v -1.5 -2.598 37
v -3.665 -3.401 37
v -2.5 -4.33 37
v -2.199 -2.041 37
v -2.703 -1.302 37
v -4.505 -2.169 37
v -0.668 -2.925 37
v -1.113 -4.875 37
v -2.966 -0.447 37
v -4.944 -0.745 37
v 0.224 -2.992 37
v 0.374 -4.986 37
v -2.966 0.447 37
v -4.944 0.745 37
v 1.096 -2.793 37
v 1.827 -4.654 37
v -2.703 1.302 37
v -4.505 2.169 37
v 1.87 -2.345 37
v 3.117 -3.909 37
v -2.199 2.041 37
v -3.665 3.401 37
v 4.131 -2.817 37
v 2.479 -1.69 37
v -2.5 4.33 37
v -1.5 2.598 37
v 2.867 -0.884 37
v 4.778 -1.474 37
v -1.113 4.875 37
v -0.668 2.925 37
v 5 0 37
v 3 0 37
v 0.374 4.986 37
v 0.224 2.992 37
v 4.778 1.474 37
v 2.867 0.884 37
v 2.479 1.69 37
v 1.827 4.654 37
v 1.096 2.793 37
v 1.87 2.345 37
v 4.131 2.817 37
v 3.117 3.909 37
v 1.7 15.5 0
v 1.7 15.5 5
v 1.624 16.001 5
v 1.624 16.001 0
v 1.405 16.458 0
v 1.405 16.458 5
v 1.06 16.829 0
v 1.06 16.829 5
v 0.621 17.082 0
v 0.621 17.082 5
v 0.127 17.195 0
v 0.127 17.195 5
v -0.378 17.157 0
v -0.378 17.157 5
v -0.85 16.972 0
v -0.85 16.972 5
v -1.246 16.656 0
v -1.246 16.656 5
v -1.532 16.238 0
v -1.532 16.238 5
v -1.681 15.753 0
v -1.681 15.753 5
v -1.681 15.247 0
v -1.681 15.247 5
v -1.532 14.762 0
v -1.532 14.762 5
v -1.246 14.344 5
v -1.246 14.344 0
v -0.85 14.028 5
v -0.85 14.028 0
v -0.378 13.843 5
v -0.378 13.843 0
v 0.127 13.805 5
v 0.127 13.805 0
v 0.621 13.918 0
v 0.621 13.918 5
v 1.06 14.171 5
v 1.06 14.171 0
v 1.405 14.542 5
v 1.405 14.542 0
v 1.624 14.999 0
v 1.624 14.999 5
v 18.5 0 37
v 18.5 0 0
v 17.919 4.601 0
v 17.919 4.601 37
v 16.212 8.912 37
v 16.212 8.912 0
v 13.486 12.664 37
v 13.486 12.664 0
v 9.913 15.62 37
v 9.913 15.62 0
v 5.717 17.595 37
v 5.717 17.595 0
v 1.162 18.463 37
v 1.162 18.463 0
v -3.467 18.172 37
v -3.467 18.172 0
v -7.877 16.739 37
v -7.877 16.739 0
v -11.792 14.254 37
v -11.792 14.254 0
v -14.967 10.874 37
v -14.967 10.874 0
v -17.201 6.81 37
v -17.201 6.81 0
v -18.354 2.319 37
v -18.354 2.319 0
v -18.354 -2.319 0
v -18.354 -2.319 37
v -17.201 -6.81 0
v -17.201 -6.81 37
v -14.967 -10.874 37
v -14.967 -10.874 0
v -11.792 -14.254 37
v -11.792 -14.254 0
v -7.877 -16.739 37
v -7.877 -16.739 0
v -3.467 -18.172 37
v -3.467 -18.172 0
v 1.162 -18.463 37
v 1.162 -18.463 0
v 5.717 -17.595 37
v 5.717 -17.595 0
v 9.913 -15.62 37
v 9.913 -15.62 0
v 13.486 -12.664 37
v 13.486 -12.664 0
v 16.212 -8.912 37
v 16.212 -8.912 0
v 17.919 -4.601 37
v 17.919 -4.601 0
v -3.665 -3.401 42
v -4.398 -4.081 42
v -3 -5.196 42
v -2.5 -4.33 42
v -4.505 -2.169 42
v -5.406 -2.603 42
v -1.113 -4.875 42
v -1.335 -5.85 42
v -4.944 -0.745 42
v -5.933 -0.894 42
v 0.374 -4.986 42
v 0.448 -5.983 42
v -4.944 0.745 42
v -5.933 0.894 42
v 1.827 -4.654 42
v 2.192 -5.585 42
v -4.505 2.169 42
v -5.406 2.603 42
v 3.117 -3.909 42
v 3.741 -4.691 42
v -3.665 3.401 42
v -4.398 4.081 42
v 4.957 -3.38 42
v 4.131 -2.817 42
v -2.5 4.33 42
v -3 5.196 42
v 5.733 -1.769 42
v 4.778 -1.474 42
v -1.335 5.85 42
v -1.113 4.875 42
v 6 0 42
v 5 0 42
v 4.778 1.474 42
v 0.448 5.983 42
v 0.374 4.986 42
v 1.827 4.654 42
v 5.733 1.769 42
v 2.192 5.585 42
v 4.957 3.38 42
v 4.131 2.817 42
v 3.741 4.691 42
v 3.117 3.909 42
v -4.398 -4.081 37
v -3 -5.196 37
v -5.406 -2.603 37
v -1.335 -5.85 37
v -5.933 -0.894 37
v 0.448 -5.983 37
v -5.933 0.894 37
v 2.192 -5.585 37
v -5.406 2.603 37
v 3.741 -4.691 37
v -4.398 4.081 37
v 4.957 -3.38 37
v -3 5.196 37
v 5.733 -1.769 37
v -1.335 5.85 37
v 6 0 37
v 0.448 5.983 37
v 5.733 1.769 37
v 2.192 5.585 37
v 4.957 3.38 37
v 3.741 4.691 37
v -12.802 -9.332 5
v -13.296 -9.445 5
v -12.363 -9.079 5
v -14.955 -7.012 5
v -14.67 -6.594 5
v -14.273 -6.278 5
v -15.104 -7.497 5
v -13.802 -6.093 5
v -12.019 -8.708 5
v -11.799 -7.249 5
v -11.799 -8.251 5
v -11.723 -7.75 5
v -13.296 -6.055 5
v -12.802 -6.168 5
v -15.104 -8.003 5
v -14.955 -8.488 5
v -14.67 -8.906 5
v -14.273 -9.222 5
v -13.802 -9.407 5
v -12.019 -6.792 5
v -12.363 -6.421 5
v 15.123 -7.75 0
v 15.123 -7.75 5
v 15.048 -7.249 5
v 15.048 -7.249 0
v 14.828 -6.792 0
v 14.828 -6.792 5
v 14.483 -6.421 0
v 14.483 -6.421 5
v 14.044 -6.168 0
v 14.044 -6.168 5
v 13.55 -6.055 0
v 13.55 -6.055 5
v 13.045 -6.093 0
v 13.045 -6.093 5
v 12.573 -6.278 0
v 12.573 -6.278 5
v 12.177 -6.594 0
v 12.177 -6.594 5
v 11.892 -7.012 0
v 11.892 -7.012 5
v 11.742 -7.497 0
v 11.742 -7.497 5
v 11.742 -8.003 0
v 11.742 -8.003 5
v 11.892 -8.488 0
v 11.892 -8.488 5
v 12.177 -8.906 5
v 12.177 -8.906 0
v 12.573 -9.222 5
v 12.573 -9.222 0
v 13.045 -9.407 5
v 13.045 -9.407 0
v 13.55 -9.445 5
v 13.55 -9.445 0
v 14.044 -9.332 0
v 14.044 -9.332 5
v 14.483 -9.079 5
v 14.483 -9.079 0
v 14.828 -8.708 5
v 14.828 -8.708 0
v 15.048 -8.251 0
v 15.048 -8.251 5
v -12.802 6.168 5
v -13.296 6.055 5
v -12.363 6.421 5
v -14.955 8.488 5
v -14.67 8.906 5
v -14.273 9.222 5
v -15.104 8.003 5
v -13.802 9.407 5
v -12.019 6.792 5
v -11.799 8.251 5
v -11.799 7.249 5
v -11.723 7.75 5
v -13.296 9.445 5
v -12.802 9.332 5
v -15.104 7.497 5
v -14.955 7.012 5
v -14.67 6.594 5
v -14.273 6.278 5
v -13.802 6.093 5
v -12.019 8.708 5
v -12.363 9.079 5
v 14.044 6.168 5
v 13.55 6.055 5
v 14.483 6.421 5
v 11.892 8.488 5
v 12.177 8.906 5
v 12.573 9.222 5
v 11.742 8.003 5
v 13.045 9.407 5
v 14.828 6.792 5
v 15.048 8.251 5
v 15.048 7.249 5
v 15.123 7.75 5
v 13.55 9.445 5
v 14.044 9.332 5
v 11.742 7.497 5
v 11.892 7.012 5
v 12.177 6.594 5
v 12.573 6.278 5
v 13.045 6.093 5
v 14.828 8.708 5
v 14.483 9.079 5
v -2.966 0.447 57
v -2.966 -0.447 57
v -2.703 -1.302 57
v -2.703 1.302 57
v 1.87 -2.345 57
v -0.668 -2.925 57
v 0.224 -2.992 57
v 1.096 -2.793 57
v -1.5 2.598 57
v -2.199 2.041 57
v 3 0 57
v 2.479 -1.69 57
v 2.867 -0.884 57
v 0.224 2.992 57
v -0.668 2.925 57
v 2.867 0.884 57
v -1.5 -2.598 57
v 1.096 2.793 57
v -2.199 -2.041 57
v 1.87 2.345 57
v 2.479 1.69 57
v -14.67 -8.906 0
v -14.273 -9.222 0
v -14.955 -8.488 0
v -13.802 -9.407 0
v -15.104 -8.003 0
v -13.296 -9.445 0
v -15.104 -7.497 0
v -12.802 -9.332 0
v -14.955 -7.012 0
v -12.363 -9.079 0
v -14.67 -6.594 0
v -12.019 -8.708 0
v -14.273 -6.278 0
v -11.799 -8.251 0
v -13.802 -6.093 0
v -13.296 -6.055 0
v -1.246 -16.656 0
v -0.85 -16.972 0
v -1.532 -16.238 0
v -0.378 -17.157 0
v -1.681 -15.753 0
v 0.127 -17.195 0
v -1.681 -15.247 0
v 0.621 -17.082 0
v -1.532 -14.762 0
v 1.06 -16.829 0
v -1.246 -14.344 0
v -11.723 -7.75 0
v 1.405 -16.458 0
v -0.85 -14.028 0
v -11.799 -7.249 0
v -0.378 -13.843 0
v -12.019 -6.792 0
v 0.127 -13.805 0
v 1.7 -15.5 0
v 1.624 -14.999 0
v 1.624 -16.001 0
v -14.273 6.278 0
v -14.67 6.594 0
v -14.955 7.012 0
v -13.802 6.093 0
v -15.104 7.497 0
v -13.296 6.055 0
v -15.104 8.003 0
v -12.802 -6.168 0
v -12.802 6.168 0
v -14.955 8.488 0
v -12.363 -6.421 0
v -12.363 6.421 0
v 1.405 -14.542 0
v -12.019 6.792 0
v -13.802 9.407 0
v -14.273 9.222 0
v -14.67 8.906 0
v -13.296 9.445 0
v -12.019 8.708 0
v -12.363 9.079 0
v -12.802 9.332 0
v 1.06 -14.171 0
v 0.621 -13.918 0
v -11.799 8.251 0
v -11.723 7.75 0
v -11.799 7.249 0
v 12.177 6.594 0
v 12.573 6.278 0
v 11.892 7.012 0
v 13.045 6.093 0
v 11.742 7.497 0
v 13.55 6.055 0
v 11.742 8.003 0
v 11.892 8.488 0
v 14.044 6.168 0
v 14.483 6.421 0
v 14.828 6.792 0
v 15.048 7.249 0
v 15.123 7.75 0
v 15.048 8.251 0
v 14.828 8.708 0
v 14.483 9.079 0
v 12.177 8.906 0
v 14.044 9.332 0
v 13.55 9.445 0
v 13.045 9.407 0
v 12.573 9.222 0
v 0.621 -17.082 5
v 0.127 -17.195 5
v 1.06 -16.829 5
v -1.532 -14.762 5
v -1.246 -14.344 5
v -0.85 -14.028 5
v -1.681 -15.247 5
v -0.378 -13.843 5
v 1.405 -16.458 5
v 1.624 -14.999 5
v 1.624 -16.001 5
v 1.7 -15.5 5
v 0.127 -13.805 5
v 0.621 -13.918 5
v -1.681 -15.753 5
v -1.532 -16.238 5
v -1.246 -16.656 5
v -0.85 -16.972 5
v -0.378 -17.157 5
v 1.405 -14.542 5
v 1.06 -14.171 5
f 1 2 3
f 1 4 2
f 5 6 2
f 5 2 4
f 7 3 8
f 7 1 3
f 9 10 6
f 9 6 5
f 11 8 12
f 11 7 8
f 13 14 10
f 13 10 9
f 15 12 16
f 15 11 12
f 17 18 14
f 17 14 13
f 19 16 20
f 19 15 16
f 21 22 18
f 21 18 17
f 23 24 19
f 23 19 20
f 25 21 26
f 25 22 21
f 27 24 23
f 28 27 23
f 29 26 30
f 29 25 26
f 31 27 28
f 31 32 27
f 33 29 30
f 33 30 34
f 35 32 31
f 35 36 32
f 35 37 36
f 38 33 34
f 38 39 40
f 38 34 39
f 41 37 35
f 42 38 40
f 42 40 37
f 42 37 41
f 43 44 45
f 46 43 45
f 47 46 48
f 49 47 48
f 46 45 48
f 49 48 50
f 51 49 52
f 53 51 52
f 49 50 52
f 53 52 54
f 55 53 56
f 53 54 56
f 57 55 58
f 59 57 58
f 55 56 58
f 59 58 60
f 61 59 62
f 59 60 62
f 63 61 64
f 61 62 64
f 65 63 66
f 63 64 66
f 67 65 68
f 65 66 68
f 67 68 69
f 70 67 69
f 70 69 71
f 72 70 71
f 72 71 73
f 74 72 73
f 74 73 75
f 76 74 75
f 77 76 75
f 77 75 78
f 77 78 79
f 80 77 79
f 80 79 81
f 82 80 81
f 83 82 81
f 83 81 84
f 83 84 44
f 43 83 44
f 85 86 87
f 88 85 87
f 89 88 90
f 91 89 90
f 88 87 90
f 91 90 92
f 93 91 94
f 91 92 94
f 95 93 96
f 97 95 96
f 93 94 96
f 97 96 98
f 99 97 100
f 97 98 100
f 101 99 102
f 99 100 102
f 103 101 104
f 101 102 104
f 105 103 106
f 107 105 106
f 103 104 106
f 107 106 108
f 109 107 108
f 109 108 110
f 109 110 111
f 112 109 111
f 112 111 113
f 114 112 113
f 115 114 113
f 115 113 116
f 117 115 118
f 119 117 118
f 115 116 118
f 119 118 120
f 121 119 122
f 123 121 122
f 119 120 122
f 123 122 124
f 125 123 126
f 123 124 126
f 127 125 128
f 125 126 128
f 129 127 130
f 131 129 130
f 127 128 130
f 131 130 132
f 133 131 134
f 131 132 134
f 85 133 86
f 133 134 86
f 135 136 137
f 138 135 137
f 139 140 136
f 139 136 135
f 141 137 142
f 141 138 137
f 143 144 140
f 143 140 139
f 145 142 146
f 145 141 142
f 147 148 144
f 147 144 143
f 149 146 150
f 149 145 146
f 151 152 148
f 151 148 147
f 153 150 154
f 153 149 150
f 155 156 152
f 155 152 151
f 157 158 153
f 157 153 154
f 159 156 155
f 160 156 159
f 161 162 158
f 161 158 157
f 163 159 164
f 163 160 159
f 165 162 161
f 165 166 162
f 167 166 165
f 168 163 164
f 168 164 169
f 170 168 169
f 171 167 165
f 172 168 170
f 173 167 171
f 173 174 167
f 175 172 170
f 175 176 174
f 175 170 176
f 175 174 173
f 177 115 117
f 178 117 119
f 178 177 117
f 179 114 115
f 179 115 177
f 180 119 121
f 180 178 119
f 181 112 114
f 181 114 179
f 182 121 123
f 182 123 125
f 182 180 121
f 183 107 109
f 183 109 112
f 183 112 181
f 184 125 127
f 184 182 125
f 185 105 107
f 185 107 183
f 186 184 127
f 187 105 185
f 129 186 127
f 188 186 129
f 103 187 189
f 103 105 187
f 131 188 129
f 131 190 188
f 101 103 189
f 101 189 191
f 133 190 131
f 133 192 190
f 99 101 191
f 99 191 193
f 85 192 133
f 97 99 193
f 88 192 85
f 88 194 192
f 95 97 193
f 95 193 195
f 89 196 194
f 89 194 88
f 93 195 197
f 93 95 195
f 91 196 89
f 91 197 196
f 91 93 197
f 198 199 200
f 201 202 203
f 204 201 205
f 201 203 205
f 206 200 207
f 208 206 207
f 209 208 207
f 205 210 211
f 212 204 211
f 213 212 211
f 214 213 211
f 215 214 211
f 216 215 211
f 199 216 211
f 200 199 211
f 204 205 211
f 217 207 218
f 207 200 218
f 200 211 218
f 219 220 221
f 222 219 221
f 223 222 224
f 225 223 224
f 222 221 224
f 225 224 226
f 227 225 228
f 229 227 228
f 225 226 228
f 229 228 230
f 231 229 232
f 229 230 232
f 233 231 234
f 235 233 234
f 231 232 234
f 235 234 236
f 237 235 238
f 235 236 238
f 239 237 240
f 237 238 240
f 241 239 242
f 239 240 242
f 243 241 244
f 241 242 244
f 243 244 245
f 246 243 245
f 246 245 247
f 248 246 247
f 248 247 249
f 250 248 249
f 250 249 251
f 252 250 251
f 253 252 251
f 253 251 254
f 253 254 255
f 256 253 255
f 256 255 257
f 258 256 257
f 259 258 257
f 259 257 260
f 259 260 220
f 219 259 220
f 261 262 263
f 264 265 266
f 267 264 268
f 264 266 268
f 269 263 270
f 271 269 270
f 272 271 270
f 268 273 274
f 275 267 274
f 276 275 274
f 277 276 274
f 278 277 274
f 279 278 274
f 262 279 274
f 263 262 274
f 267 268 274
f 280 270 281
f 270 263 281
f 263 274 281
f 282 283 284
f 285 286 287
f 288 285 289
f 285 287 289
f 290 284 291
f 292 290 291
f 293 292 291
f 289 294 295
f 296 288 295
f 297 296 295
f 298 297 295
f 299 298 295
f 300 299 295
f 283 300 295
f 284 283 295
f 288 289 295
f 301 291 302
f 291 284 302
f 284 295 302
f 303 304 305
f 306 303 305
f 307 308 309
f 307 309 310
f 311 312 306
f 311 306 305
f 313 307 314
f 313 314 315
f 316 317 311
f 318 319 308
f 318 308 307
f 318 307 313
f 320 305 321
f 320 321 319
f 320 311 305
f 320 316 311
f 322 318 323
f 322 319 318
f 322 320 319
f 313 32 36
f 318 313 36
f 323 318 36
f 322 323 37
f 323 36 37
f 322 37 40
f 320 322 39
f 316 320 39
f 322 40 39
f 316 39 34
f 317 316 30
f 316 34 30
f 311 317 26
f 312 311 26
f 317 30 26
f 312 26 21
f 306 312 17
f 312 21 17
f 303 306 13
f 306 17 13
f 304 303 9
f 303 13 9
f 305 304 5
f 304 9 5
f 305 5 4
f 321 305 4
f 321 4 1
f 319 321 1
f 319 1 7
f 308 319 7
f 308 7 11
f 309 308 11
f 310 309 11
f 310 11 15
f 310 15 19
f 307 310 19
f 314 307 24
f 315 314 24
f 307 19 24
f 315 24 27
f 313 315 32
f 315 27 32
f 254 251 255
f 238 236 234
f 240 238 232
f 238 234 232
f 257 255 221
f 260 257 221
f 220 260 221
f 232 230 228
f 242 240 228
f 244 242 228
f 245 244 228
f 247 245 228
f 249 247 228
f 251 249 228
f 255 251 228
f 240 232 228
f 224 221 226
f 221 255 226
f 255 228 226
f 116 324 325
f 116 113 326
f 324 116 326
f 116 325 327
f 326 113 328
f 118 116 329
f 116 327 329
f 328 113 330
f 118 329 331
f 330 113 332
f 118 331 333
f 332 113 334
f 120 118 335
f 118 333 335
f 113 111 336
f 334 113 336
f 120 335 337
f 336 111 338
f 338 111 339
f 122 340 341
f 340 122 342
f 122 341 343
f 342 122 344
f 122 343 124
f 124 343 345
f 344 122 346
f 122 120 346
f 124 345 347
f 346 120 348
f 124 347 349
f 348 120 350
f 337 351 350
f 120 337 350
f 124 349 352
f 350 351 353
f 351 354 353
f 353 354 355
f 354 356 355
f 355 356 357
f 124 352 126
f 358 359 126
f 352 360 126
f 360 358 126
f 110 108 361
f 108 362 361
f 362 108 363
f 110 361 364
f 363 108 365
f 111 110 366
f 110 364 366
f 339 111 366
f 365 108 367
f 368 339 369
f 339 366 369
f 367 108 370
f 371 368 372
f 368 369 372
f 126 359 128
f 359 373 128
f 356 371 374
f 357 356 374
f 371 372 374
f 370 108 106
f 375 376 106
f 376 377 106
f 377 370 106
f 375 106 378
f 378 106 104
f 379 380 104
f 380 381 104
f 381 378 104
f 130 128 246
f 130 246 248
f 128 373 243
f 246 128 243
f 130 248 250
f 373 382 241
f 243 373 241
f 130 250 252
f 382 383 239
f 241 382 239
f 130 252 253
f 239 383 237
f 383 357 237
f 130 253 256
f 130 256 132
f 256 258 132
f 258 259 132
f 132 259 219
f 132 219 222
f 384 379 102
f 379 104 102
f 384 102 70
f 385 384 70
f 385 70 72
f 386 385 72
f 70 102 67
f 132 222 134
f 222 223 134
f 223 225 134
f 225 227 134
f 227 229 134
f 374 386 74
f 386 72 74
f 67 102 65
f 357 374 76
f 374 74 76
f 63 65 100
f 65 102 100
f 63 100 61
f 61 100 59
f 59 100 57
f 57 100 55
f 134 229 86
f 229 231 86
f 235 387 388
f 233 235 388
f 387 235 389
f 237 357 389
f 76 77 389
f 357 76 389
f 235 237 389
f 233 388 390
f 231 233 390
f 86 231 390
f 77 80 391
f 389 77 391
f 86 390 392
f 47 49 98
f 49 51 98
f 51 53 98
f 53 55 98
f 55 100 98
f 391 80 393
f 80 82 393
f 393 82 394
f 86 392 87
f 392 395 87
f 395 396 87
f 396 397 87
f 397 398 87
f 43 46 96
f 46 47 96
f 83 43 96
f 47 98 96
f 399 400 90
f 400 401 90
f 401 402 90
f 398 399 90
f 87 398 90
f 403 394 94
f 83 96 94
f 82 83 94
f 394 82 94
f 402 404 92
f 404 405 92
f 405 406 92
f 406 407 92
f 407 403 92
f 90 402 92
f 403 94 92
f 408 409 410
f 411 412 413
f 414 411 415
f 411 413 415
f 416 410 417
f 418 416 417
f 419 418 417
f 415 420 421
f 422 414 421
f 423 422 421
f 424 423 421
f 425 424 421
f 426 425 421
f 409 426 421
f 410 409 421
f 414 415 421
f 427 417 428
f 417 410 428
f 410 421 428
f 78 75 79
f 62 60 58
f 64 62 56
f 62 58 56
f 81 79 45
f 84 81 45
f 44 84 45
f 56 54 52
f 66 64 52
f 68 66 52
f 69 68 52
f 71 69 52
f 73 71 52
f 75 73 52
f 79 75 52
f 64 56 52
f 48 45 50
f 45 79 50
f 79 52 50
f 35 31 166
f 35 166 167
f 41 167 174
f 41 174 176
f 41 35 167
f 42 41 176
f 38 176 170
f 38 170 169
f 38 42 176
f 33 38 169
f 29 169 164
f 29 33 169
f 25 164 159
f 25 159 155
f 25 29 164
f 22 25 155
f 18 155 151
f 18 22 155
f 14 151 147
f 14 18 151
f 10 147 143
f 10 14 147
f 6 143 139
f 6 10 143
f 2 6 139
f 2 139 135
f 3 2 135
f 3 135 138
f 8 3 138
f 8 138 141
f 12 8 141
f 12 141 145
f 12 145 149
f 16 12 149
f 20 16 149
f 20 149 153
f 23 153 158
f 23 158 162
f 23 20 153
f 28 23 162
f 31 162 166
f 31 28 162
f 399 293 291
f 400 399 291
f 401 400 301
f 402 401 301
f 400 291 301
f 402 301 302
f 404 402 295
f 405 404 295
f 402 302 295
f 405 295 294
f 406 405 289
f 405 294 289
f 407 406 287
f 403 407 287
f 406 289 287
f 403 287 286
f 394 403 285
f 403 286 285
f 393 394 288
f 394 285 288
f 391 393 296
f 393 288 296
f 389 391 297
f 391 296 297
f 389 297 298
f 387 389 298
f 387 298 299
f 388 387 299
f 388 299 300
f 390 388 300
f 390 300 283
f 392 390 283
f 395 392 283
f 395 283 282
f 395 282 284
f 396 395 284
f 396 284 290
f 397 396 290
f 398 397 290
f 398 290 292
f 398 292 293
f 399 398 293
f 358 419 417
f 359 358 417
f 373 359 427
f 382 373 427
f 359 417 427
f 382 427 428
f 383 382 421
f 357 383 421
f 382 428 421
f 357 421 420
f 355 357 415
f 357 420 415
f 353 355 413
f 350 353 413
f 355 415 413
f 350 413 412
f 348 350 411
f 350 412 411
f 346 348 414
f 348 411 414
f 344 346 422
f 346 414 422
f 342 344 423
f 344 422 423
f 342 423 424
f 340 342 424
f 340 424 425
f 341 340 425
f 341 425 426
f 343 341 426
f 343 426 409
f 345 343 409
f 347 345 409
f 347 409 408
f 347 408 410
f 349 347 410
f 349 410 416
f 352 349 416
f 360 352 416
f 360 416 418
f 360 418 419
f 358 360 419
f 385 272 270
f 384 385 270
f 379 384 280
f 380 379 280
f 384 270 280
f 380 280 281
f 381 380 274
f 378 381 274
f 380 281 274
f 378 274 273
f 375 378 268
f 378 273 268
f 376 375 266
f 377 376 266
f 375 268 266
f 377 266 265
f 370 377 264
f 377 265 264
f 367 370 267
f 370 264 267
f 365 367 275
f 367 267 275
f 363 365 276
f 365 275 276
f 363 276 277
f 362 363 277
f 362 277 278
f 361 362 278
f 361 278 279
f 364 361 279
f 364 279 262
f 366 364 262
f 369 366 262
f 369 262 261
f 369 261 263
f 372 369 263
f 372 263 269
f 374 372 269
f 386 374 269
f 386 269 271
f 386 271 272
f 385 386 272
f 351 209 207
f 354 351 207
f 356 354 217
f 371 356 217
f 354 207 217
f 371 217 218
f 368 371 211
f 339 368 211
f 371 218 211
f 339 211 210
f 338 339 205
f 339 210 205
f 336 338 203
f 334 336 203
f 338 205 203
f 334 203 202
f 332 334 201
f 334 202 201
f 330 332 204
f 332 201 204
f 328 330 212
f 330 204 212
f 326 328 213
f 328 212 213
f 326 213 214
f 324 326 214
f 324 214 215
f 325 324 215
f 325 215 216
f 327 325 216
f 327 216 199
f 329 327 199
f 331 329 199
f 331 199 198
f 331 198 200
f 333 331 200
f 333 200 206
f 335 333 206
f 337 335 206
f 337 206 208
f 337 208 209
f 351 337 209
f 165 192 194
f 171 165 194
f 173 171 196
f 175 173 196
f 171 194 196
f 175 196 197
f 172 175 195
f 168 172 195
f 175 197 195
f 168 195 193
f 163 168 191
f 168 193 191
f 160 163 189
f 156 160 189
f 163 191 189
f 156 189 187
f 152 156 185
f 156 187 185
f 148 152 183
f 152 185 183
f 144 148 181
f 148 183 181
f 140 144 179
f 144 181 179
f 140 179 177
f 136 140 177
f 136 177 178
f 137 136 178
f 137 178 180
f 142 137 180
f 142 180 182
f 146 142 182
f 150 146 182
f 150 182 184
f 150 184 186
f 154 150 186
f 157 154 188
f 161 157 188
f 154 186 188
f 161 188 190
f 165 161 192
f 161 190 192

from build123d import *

# Parameters (mm, degrees)
CROQUIS1_R                       = 18.5
SALIENTE_EXTRUIR1_DEPTH          = 37
CROQUIS2_R                       = 6
CROQUIS2_R_2                     = 5
SALIENTE_EXTRUIR2_DEPTH          = 5
CROQUIS2_3_R                     = 3
SALIENTE_EXTRUIR3_DEPTH          = 20
TALADRO_DE_MARGEN_PARA_M31_D     = 3.4
TALADRO_DE_MARGEN_PARA_M31_DEPTH = 5


with BuildPart() as part:
    # Croquis1 → Saliente-Extruir1 (new body)
    with BuildSketch(Plane.XY):
        Circle(CROQUIS1_R)
    extrude(amount=SALIENTE_EXTRUIR1_DEPTH)

    # Croquis2 → Saliente-Extruir2 (add)
    with BuildSketch(Plane.XY.offset(37)):
        Circle(CROQUIS2_R)
        Circle(CROQUIS2_R_2, mode=Mode.SUBTRACT)
    extrude(amount=SALIENTE_EXTRUIR2_DEPTH)

    # Croquis2<3> → Saliente-Extruir3 (add)
    with BuildSketch(Plane.XY.offset(37)):
        Circle(CROQUIS2_3_R)
    extrude(amount=SALIENTE_EXTRUIR3_DEPTH)

    # Taladro de margen para M31
    with Locations(Plane(origin=(0, 0, 0), x_dir=(-1, 0, 0), z_dir=(0, 0, -1))):
        with Locations((0, 15.5), (13.423393759, 7.75), (13.423393759, -7.75), (0, -15.5), (-13.423393759, -7.75), (-13.423393759, 7.75)):
            Hole(TALADRO_DE_MARGEN_PARA_M31_D / 2, depth=TALADRO_DE_MARGEN_PARA_M31_DEPTH)


solid = part.part
